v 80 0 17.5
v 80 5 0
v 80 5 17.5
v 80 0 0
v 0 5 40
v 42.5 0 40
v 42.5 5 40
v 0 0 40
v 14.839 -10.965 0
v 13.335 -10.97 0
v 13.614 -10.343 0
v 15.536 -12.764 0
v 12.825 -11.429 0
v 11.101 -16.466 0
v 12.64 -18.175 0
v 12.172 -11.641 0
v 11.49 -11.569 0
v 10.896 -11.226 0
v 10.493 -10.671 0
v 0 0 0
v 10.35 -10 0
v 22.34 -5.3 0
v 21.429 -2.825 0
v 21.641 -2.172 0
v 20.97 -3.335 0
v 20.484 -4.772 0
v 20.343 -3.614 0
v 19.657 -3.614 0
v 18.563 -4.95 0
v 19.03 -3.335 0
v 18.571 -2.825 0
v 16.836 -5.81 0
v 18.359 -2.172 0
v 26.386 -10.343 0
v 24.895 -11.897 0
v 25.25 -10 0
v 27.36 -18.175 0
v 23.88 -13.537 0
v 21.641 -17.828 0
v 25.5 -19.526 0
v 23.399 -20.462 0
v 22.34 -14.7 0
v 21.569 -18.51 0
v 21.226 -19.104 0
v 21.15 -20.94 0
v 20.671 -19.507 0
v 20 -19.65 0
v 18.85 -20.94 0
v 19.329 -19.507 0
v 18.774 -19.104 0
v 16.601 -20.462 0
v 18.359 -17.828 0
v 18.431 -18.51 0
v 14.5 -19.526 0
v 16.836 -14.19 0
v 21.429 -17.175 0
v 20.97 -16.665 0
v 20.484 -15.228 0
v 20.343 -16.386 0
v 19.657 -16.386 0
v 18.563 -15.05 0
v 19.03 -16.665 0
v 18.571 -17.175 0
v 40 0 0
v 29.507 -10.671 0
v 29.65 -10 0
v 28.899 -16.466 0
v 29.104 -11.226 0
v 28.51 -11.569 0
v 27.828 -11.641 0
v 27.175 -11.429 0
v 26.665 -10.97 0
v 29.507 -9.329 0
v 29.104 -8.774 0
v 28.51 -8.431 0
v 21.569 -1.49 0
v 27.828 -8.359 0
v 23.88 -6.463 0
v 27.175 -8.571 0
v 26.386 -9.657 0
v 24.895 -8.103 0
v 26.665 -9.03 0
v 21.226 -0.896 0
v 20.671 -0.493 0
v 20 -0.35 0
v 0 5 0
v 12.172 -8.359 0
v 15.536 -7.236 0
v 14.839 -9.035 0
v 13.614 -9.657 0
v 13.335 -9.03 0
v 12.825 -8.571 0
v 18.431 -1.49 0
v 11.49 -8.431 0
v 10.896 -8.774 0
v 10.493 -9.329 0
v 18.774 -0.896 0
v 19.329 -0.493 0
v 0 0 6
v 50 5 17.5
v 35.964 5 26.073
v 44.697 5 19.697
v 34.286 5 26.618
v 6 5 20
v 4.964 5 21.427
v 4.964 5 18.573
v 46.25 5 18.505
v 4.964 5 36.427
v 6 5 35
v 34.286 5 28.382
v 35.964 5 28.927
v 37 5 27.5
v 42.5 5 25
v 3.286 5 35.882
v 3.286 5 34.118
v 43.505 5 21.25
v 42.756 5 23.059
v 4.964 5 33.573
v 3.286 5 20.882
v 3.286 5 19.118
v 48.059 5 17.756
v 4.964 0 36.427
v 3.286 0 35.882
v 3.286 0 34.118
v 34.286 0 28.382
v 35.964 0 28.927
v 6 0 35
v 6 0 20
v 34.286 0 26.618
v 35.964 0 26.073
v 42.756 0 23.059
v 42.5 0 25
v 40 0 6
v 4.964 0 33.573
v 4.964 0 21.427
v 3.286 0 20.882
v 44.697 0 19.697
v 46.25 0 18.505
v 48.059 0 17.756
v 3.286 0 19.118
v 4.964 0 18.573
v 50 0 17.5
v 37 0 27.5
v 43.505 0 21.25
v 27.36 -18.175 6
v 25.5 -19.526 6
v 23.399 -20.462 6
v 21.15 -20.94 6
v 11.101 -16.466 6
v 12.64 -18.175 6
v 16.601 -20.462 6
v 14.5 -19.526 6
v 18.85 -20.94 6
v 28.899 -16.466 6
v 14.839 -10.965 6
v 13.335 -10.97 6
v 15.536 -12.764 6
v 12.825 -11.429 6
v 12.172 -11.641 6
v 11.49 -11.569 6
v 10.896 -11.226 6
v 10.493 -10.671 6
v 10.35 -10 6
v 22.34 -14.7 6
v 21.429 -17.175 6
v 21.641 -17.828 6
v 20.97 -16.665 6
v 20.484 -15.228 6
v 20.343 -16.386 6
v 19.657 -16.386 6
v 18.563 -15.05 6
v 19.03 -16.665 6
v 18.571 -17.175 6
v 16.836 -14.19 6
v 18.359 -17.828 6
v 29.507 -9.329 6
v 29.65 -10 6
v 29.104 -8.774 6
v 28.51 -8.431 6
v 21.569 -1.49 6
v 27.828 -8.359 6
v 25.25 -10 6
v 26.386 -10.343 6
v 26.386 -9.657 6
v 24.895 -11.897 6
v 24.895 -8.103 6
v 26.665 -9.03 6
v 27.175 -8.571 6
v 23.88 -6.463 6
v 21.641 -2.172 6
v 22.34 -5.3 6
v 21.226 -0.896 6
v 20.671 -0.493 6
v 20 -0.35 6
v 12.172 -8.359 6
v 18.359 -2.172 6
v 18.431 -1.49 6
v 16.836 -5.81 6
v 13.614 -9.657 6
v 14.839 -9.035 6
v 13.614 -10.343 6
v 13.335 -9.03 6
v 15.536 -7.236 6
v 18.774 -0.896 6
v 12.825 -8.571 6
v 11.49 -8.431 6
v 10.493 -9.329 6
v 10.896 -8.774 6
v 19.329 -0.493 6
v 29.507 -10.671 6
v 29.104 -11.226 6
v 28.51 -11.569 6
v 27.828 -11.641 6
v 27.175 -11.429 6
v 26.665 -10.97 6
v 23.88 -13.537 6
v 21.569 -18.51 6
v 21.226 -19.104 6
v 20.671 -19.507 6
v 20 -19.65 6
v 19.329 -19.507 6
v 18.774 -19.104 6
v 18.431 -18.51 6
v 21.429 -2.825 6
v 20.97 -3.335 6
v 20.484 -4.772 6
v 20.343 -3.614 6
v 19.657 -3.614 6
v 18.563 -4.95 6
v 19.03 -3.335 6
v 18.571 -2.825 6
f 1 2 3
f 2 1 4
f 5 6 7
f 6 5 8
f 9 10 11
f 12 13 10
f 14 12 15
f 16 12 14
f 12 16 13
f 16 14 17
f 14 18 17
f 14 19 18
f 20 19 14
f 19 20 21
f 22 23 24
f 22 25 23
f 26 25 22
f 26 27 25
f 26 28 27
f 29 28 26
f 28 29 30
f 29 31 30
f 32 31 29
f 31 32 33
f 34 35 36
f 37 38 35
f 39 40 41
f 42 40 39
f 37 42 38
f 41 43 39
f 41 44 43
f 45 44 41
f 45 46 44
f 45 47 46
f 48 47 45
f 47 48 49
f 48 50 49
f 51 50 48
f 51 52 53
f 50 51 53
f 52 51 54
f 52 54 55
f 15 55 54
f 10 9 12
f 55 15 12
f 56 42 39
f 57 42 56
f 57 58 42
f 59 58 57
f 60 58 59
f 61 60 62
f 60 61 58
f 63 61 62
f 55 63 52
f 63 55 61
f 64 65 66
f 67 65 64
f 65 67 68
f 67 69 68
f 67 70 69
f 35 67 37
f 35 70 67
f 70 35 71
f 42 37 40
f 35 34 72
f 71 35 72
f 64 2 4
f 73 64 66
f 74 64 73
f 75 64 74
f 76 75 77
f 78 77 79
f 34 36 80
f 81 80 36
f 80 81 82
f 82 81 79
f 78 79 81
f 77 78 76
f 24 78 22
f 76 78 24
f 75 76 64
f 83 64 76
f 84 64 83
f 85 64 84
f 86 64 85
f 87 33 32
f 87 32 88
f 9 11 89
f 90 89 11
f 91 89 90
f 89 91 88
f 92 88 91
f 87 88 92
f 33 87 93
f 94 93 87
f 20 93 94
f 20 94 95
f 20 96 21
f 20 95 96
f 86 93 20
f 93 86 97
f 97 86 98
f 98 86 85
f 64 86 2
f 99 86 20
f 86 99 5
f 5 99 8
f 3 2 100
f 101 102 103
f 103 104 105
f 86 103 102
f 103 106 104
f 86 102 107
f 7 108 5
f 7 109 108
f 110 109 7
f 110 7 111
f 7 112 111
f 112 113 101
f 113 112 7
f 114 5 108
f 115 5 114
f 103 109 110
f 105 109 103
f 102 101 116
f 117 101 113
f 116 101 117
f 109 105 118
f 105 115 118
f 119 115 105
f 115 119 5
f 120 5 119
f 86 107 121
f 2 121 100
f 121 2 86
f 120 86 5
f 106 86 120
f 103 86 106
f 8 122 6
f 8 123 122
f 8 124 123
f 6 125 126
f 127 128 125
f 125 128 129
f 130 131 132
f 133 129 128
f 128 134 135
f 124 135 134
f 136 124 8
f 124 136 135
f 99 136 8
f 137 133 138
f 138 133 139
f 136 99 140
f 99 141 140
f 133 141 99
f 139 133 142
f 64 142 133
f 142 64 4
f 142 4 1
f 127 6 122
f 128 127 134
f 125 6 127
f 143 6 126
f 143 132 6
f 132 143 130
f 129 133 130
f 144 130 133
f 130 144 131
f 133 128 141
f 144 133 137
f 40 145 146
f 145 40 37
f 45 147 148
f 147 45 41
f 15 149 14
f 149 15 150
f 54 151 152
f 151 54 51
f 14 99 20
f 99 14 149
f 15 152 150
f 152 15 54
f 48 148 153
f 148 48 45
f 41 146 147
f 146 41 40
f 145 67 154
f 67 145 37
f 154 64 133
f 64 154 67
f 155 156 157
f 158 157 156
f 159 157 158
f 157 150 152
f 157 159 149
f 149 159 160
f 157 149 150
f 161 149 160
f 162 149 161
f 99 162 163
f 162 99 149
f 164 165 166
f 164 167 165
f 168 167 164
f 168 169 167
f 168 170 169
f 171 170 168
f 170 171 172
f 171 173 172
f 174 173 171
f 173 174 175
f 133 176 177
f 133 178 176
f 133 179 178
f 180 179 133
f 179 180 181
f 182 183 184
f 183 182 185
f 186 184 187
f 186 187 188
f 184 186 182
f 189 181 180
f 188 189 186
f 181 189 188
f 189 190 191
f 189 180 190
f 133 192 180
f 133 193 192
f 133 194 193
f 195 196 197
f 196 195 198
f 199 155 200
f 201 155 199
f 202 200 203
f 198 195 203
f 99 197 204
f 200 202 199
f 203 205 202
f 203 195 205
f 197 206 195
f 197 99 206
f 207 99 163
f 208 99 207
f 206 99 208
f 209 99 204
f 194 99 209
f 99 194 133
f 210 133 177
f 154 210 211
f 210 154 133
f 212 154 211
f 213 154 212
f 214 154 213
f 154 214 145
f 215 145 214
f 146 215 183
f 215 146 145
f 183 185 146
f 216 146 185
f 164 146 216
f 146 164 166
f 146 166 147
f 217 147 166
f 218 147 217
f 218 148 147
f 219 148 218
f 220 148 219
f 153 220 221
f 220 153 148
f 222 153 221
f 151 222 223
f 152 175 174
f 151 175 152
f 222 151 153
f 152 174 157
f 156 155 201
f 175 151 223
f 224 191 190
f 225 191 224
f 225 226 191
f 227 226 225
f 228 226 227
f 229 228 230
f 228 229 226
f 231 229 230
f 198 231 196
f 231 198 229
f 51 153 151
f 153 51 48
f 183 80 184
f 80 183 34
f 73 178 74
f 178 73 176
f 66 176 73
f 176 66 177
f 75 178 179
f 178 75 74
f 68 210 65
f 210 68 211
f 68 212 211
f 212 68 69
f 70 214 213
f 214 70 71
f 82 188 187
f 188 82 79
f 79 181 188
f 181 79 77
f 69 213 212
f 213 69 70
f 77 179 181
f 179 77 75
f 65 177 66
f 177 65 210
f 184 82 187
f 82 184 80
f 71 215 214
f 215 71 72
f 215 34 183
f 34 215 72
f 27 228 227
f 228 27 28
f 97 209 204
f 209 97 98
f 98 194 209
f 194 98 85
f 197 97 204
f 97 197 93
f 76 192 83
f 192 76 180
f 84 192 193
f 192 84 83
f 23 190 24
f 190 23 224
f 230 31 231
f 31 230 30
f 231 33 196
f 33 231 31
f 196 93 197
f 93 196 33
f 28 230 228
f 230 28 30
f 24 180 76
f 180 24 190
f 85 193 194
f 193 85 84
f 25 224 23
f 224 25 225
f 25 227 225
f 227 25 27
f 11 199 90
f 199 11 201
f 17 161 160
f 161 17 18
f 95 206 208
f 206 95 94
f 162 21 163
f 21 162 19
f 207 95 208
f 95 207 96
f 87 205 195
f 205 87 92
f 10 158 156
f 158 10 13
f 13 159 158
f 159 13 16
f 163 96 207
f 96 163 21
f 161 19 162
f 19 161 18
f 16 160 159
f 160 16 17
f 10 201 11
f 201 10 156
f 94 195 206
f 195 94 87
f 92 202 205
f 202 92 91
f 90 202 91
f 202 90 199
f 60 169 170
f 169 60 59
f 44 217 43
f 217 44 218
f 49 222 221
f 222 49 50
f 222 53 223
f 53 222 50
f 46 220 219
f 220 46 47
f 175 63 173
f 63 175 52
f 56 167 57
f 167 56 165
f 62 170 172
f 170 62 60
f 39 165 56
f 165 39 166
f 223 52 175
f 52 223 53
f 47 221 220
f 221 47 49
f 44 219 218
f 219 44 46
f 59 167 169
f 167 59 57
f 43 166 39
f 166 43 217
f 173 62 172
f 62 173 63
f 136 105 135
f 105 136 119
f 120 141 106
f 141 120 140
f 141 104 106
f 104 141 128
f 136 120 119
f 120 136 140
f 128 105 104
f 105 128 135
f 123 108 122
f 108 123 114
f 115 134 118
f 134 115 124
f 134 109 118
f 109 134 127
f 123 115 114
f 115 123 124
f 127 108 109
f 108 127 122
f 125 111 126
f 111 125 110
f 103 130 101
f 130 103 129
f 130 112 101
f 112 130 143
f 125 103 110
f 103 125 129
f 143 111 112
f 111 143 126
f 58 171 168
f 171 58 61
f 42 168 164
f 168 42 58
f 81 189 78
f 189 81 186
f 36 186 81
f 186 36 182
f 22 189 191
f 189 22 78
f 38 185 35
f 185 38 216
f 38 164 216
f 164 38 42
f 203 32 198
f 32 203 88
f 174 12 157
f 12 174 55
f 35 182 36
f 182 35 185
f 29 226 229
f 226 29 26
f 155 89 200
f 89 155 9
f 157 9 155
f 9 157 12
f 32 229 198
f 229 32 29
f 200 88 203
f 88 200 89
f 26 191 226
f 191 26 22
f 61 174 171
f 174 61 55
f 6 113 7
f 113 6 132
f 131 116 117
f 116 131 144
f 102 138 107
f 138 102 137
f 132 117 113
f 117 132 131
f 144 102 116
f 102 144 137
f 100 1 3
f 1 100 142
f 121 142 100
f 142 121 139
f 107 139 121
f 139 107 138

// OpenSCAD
/**
 * 
 * Zplate.scad
 * 
 * Created by Diego Viejo
 * 11/Oct/2019
 * 
 * This part has to connect z-rods with aluminium XPlate. It also has to work as holder
 * for Xendstop and for the adjustmen screw for the Z-endstop.
 * 
 */

Length = 80;
Width = 5;
Height = 40;
holeX1 = 4.5;
holeX2 = 35.5;
holeY1 = 20;
holeY2 = 27.5;
holeY3 = 35;

ZAxisX = holeX1 + (holeX2-holeX1)/2;
ZAxisY = 10; //CHECK THIS

module ZPlate()
difference()
{
    union()
    {
        cube([Length, Width, Height]);
        
        hull()
        {
            translate([ZAxisX, -ZAxisY, 0]) cylinder(d=22, h=6);
            cube([2*ZAxisX, Width, 6]);
            
        }
    }
    
    //XPlate junction holes
    translate([holeX1, -1, holeY1]) rotate([-90, 0, 0]) cylinder(d=3, h=Width+2);
    translate([holeX1, -1, holeY3]) rotate([-90, 0, 0]) cylinder(d=3, h=Width+2);
    translate([holeX2, -1, holeY2]) rotate([-90, 0, 0]) cylinder(d=3, h=Width+2);
    
    //Nut holder
    #translate([ZAxisX, -ZAxisY, -1]) cylinder(d=10.5, h=Height);
    for(i=[0, 90, 180, 270])
    #translate([ZAxisX, -ZAxisY, -1]) rotate(i)
        translate([16/2, 0, 0]) cylinder(d=3.3, h=6+2, $fn=15);
        
    //Fancy
    hull()
    {
        translate([2*ZAxisX+10, -1, 25]) rotate([-90, 0, 0]) cylinder(d=15, h=Width+2);
        translate([5*ZAxisX+10, -1, 25]) rotate([-90, 0, 0]) cylinder(d=15, h=Width+2);
        translate([2*ZAxisX+10, -1, 125]) rotate([-90, 0, 0]) cylinder(d=15, h=Width+2);
    }
}

ZPlate();
